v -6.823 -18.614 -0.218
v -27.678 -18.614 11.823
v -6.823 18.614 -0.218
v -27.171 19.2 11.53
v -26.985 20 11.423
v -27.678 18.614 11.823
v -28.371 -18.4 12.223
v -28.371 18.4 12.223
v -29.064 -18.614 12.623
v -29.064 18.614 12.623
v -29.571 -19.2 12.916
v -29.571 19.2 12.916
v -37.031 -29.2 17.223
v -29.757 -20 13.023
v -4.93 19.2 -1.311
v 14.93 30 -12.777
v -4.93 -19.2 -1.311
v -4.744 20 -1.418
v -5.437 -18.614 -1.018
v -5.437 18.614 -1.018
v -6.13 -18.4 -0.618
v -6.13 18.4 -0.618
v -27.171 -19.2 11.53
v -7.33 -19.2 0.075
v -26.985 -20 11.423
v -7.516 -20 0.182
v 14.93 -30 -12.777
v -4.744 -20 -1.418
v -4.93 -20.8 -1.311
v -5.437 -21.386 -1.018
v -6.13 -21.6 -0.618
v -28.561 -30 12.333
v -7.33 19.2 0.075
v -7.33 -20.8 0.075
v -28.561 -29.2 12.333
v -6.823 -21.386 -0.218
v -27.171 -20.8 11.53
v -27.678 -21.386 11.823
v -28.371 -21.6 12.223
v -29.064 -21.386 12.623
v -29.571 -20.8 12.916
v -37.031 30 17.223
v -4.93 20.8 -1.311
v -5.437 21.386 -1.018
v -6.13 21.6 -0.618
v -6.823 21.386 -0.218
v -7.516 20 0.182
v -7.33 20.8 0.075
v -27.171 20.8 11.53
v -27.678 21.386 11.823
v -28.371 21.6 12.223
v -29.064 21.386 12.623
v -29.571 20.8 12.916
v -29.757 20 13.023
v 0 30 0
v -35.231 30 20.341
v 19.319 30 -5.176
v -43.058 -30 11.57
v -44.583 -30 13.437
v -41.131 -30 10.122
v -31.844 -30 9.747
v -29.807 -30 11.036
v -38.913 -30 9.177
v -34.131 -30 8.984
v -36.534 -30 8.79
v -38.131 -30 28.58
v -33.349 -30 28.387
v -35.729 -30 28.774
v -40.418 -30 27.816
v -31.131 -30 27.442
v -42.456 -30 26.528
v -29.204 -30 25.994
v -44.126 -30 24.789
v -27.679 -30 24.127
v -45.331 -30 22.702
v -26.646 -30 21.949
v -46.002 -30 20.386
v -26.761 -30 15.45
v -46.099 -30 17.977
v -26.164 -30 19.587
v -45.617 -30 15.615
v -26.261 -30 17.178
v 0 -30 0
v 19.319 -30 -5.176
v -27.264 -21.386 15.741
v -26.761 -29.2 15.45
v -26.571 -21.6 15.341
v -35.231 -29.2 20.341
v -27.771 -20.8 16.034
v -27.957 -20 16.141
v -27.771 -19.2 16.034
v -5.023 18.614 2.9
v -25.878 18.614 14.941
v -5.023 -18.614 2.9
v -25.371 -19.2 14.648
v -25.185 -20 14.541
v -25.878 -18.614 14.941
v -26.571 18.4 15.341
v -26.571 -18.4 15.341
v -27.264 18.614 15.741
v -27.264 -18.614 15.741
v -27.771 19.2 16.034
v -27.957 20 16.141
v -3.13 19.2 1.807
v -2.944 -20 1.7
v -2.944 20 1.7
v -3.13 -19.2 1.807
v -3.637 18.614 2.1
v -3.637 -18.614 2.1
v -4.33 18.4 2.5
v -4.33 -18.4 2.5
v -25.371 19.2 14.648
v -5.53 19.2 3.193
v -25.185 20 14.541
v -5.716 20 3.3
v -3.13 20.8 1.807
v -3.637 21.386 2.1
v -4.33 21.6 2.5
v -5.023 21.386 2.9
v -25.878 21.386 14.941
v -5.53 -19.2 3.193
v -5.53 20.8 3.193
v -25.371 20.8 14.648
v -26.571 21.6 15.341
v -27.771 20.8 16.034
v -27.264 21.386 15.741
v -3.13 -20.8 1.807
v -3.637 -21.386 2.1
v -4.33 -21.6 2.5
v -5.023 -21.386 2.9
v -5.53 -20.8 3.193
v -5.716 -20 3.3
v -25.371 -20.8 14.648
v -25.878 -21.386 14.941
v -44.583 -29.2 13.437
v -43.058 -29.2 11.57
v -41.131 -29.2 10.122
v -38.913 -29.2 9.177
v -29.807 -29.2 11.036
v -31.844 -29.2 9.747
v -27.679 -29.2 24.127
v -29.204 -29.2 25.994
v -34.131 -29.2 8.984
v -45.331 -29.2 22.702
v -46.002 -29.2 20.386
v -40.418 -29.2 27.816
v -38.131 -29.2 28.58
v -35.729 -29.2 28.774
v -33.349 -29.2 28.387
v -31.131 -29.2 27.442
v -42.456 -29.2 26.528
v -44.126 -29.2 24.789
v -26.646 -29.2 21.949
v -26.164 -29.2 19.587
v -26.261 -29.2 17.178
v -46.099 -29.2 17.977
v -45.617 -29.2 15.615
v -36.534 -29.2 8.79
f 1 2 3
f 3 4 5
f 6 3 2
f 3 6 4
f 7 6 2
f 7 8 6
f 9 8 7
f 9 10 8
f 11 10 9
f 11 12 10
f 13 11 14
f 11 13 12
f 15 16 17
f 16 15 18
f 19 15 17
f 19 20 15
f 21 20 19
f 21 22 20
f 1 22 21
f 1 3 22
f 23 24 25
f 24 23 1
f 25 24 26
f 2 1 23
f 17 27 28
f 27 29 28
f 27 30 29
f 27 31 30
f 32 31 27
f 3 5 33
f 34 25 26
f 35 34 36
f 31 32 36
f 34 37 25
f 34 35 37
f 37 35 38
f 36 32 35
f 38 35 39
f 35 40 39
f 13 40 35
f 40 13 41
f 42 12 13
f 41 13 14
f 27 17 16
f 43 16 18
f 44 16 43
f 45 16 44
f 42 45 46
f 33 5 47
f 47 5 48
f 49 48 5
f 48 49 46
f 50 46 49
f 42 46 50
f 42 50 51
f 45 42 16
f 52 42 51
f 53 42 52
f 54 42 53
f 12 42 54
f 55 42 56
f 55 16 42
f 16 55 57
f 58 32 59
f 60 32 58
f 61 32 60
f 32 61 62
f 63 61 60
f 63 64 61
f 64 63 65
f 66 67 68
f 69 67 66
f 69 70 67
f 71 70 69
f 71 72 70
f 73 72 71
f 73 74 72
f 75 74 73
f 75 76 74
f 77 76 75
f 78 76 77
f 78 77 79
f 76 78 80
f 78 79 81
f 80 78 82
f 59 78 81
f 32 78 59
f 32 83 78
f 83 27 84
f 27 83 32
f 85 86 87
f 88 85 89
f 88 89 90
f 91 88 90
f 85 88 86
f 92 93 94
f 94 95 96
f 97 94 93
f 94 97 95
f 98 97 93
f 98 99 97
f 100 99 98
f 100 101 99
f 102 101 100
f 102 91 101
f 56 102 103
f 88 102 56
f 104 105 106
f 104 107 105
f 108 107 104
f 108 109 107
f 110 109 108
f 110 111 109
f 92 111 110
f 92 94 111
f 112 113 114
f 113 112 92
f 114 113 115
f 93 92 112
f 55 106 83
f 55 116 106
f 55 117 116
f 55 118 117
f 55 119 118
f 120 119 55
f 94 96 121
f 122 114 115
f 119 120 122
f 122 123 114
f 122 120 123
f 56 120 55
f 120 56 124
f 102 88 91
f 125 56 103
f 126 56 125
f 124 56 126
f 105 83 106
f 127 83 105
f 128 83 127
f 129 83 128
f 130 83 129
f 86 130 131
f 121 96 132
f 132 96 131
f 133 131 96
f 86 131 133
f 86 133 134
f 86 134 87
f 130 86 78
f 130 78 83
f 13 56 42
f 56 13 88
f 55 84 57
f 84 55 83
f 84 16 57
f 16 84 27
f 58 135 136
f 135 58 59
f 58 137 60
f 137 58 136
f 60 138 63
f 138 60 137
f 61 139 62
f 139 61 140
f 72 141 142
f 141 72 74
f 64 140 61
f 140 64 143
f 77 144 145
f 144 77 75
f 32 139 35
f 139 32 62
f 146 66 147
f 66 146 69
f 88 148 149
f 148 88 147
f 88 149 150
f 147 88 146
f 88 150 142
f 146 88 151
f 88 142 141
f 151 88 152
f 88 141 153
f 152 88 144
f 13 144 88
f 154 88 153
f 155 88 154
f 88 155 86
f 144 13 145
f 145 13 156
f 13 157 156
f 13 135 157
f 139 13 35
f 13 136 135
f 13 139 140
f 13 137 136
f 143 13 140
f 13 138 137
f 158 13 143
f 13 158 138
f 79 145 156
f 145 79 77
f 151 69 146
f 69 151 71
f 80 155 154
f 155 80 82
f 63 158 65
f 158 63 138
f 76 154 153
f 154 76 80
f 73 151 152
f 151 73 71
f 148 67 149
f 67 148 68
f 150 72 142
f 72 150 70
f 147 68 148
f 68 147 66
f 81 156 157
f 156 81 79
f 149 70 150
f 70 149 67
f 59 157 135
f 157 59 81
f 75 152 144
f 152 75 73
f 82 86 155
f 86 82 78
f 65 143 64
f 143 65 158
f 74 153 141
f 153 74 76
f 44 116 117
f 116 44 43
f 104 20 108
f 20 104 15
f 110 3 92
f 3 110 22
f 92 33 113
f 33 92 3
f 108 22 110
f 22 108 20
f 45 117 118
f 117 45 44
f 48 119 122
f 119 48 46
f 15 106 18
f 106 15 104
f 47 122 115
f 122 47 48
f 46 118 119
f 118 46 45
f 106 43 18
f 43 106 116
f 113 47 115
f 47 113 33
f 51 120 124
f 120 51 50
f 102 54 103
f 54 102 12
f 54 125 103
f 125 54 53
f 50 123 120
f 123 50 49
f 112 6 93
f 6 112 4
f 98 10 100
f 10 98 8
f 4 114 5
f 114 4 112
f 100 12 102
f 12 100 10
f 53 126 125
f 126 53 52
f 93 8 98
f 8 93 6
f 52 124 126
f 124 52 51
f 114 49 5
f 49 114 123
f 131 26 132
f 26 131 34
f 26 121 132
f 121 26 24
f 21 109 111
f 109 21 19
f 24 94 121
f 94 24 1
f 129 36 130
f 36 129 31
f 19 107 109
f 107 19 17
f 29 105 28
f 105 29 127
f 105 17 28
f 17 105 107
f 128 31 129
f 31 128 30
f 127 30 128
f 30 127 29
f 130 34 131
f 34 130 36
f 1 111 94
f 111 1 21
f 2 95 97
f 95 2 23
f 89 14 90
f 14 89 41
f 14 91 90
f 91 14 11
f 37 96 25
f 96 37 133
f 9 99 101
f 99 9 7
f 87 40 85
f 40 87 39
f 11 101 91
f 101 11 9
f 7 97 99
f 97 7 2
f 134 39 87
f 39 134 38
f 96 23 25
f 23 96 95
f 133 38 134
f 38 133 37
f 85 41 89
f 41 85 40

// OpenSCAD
 extr=20; h = 3*extr; w = h; diagonal = extr*sqrt(2); thickness=3.6; 
 rear_hole_dist=extr/2; screw_hole=3.2; forward_hole_dist=5; frame_type=0; layer_h=0.4;
 

module frame_axis_block(h, w, thickness, extr, diagonal, frame_type, forward_hole_dist, rear_hole_dist,screw_hole,layer_h) 
{
  difference() {
    union(){
      intersection() {
        //rotate([0, 0, -30])
         translate([-extr*sin(15), -extr*cos(15), -h/2], center=false)
	          cube([extr*sin(15)+thickness, w, h]);
        union() {
	        translate([0,-extr*cos(15), -h/2]) 
        //   rotate([0, 0, -30])
	            cube([thickness, w, h]); //main frame plate
  	    //  rotate([0, 0, -45])
          translate([-extr*sin(15), -extr*cos(15), -h/2])
            rotate([0,0,-15])
	            cube([extr, extr, h], center=false); //15degr extr cutout
        }
      }

      //mickey mouse ears
            translate([thickness/2, w-extr*cos(15), -(h)/2+layer_h])
              cylinder (r=10, h=layer_h*2,center=true, $fn=26);
    } 
    
    if (frame_type ==1) {
      // Vertical OpenBeam mounting screw holes.
        for (z=[-1, 1]) 
          translate([0, 0, (h-extr)/2*z]) 
            rotate([90, 0, 75])
              translate([-extr/2, 0, extr/2*sin(15)+5]) 
                 cylinder(r=screw_hole/2, h=50, $fn=12, center=true);

      }


    // Horizontal OpenBeam mounting screw holes.
       for (z= [h/2-extr/2, -h/2+extr/2])
       for (y = [forward_hole_dist, w-extr*cos(15)-rear_hole_dist]) 
           translate([0, y, z])
             rotate([0, 90, 0])
               cylinder(r=screw_hole/2, h=10, $fn=12, center=true);
}
}
//
 scale([1, 1, 1]) rotate([0, 90, 90]) rotate([0, 0, 30]) 
{ frame_axis_block(h, w, thickness, extr, diagonal, frame_type, forward_hole_dist, rear_hole_dist,screw_hole,layer_h);
    translate([-extr*sin(15), -extr*cos(15), -h]) rotate([0, 0, 75]) % cube([extr, extr, 1000], center=false);
   }
